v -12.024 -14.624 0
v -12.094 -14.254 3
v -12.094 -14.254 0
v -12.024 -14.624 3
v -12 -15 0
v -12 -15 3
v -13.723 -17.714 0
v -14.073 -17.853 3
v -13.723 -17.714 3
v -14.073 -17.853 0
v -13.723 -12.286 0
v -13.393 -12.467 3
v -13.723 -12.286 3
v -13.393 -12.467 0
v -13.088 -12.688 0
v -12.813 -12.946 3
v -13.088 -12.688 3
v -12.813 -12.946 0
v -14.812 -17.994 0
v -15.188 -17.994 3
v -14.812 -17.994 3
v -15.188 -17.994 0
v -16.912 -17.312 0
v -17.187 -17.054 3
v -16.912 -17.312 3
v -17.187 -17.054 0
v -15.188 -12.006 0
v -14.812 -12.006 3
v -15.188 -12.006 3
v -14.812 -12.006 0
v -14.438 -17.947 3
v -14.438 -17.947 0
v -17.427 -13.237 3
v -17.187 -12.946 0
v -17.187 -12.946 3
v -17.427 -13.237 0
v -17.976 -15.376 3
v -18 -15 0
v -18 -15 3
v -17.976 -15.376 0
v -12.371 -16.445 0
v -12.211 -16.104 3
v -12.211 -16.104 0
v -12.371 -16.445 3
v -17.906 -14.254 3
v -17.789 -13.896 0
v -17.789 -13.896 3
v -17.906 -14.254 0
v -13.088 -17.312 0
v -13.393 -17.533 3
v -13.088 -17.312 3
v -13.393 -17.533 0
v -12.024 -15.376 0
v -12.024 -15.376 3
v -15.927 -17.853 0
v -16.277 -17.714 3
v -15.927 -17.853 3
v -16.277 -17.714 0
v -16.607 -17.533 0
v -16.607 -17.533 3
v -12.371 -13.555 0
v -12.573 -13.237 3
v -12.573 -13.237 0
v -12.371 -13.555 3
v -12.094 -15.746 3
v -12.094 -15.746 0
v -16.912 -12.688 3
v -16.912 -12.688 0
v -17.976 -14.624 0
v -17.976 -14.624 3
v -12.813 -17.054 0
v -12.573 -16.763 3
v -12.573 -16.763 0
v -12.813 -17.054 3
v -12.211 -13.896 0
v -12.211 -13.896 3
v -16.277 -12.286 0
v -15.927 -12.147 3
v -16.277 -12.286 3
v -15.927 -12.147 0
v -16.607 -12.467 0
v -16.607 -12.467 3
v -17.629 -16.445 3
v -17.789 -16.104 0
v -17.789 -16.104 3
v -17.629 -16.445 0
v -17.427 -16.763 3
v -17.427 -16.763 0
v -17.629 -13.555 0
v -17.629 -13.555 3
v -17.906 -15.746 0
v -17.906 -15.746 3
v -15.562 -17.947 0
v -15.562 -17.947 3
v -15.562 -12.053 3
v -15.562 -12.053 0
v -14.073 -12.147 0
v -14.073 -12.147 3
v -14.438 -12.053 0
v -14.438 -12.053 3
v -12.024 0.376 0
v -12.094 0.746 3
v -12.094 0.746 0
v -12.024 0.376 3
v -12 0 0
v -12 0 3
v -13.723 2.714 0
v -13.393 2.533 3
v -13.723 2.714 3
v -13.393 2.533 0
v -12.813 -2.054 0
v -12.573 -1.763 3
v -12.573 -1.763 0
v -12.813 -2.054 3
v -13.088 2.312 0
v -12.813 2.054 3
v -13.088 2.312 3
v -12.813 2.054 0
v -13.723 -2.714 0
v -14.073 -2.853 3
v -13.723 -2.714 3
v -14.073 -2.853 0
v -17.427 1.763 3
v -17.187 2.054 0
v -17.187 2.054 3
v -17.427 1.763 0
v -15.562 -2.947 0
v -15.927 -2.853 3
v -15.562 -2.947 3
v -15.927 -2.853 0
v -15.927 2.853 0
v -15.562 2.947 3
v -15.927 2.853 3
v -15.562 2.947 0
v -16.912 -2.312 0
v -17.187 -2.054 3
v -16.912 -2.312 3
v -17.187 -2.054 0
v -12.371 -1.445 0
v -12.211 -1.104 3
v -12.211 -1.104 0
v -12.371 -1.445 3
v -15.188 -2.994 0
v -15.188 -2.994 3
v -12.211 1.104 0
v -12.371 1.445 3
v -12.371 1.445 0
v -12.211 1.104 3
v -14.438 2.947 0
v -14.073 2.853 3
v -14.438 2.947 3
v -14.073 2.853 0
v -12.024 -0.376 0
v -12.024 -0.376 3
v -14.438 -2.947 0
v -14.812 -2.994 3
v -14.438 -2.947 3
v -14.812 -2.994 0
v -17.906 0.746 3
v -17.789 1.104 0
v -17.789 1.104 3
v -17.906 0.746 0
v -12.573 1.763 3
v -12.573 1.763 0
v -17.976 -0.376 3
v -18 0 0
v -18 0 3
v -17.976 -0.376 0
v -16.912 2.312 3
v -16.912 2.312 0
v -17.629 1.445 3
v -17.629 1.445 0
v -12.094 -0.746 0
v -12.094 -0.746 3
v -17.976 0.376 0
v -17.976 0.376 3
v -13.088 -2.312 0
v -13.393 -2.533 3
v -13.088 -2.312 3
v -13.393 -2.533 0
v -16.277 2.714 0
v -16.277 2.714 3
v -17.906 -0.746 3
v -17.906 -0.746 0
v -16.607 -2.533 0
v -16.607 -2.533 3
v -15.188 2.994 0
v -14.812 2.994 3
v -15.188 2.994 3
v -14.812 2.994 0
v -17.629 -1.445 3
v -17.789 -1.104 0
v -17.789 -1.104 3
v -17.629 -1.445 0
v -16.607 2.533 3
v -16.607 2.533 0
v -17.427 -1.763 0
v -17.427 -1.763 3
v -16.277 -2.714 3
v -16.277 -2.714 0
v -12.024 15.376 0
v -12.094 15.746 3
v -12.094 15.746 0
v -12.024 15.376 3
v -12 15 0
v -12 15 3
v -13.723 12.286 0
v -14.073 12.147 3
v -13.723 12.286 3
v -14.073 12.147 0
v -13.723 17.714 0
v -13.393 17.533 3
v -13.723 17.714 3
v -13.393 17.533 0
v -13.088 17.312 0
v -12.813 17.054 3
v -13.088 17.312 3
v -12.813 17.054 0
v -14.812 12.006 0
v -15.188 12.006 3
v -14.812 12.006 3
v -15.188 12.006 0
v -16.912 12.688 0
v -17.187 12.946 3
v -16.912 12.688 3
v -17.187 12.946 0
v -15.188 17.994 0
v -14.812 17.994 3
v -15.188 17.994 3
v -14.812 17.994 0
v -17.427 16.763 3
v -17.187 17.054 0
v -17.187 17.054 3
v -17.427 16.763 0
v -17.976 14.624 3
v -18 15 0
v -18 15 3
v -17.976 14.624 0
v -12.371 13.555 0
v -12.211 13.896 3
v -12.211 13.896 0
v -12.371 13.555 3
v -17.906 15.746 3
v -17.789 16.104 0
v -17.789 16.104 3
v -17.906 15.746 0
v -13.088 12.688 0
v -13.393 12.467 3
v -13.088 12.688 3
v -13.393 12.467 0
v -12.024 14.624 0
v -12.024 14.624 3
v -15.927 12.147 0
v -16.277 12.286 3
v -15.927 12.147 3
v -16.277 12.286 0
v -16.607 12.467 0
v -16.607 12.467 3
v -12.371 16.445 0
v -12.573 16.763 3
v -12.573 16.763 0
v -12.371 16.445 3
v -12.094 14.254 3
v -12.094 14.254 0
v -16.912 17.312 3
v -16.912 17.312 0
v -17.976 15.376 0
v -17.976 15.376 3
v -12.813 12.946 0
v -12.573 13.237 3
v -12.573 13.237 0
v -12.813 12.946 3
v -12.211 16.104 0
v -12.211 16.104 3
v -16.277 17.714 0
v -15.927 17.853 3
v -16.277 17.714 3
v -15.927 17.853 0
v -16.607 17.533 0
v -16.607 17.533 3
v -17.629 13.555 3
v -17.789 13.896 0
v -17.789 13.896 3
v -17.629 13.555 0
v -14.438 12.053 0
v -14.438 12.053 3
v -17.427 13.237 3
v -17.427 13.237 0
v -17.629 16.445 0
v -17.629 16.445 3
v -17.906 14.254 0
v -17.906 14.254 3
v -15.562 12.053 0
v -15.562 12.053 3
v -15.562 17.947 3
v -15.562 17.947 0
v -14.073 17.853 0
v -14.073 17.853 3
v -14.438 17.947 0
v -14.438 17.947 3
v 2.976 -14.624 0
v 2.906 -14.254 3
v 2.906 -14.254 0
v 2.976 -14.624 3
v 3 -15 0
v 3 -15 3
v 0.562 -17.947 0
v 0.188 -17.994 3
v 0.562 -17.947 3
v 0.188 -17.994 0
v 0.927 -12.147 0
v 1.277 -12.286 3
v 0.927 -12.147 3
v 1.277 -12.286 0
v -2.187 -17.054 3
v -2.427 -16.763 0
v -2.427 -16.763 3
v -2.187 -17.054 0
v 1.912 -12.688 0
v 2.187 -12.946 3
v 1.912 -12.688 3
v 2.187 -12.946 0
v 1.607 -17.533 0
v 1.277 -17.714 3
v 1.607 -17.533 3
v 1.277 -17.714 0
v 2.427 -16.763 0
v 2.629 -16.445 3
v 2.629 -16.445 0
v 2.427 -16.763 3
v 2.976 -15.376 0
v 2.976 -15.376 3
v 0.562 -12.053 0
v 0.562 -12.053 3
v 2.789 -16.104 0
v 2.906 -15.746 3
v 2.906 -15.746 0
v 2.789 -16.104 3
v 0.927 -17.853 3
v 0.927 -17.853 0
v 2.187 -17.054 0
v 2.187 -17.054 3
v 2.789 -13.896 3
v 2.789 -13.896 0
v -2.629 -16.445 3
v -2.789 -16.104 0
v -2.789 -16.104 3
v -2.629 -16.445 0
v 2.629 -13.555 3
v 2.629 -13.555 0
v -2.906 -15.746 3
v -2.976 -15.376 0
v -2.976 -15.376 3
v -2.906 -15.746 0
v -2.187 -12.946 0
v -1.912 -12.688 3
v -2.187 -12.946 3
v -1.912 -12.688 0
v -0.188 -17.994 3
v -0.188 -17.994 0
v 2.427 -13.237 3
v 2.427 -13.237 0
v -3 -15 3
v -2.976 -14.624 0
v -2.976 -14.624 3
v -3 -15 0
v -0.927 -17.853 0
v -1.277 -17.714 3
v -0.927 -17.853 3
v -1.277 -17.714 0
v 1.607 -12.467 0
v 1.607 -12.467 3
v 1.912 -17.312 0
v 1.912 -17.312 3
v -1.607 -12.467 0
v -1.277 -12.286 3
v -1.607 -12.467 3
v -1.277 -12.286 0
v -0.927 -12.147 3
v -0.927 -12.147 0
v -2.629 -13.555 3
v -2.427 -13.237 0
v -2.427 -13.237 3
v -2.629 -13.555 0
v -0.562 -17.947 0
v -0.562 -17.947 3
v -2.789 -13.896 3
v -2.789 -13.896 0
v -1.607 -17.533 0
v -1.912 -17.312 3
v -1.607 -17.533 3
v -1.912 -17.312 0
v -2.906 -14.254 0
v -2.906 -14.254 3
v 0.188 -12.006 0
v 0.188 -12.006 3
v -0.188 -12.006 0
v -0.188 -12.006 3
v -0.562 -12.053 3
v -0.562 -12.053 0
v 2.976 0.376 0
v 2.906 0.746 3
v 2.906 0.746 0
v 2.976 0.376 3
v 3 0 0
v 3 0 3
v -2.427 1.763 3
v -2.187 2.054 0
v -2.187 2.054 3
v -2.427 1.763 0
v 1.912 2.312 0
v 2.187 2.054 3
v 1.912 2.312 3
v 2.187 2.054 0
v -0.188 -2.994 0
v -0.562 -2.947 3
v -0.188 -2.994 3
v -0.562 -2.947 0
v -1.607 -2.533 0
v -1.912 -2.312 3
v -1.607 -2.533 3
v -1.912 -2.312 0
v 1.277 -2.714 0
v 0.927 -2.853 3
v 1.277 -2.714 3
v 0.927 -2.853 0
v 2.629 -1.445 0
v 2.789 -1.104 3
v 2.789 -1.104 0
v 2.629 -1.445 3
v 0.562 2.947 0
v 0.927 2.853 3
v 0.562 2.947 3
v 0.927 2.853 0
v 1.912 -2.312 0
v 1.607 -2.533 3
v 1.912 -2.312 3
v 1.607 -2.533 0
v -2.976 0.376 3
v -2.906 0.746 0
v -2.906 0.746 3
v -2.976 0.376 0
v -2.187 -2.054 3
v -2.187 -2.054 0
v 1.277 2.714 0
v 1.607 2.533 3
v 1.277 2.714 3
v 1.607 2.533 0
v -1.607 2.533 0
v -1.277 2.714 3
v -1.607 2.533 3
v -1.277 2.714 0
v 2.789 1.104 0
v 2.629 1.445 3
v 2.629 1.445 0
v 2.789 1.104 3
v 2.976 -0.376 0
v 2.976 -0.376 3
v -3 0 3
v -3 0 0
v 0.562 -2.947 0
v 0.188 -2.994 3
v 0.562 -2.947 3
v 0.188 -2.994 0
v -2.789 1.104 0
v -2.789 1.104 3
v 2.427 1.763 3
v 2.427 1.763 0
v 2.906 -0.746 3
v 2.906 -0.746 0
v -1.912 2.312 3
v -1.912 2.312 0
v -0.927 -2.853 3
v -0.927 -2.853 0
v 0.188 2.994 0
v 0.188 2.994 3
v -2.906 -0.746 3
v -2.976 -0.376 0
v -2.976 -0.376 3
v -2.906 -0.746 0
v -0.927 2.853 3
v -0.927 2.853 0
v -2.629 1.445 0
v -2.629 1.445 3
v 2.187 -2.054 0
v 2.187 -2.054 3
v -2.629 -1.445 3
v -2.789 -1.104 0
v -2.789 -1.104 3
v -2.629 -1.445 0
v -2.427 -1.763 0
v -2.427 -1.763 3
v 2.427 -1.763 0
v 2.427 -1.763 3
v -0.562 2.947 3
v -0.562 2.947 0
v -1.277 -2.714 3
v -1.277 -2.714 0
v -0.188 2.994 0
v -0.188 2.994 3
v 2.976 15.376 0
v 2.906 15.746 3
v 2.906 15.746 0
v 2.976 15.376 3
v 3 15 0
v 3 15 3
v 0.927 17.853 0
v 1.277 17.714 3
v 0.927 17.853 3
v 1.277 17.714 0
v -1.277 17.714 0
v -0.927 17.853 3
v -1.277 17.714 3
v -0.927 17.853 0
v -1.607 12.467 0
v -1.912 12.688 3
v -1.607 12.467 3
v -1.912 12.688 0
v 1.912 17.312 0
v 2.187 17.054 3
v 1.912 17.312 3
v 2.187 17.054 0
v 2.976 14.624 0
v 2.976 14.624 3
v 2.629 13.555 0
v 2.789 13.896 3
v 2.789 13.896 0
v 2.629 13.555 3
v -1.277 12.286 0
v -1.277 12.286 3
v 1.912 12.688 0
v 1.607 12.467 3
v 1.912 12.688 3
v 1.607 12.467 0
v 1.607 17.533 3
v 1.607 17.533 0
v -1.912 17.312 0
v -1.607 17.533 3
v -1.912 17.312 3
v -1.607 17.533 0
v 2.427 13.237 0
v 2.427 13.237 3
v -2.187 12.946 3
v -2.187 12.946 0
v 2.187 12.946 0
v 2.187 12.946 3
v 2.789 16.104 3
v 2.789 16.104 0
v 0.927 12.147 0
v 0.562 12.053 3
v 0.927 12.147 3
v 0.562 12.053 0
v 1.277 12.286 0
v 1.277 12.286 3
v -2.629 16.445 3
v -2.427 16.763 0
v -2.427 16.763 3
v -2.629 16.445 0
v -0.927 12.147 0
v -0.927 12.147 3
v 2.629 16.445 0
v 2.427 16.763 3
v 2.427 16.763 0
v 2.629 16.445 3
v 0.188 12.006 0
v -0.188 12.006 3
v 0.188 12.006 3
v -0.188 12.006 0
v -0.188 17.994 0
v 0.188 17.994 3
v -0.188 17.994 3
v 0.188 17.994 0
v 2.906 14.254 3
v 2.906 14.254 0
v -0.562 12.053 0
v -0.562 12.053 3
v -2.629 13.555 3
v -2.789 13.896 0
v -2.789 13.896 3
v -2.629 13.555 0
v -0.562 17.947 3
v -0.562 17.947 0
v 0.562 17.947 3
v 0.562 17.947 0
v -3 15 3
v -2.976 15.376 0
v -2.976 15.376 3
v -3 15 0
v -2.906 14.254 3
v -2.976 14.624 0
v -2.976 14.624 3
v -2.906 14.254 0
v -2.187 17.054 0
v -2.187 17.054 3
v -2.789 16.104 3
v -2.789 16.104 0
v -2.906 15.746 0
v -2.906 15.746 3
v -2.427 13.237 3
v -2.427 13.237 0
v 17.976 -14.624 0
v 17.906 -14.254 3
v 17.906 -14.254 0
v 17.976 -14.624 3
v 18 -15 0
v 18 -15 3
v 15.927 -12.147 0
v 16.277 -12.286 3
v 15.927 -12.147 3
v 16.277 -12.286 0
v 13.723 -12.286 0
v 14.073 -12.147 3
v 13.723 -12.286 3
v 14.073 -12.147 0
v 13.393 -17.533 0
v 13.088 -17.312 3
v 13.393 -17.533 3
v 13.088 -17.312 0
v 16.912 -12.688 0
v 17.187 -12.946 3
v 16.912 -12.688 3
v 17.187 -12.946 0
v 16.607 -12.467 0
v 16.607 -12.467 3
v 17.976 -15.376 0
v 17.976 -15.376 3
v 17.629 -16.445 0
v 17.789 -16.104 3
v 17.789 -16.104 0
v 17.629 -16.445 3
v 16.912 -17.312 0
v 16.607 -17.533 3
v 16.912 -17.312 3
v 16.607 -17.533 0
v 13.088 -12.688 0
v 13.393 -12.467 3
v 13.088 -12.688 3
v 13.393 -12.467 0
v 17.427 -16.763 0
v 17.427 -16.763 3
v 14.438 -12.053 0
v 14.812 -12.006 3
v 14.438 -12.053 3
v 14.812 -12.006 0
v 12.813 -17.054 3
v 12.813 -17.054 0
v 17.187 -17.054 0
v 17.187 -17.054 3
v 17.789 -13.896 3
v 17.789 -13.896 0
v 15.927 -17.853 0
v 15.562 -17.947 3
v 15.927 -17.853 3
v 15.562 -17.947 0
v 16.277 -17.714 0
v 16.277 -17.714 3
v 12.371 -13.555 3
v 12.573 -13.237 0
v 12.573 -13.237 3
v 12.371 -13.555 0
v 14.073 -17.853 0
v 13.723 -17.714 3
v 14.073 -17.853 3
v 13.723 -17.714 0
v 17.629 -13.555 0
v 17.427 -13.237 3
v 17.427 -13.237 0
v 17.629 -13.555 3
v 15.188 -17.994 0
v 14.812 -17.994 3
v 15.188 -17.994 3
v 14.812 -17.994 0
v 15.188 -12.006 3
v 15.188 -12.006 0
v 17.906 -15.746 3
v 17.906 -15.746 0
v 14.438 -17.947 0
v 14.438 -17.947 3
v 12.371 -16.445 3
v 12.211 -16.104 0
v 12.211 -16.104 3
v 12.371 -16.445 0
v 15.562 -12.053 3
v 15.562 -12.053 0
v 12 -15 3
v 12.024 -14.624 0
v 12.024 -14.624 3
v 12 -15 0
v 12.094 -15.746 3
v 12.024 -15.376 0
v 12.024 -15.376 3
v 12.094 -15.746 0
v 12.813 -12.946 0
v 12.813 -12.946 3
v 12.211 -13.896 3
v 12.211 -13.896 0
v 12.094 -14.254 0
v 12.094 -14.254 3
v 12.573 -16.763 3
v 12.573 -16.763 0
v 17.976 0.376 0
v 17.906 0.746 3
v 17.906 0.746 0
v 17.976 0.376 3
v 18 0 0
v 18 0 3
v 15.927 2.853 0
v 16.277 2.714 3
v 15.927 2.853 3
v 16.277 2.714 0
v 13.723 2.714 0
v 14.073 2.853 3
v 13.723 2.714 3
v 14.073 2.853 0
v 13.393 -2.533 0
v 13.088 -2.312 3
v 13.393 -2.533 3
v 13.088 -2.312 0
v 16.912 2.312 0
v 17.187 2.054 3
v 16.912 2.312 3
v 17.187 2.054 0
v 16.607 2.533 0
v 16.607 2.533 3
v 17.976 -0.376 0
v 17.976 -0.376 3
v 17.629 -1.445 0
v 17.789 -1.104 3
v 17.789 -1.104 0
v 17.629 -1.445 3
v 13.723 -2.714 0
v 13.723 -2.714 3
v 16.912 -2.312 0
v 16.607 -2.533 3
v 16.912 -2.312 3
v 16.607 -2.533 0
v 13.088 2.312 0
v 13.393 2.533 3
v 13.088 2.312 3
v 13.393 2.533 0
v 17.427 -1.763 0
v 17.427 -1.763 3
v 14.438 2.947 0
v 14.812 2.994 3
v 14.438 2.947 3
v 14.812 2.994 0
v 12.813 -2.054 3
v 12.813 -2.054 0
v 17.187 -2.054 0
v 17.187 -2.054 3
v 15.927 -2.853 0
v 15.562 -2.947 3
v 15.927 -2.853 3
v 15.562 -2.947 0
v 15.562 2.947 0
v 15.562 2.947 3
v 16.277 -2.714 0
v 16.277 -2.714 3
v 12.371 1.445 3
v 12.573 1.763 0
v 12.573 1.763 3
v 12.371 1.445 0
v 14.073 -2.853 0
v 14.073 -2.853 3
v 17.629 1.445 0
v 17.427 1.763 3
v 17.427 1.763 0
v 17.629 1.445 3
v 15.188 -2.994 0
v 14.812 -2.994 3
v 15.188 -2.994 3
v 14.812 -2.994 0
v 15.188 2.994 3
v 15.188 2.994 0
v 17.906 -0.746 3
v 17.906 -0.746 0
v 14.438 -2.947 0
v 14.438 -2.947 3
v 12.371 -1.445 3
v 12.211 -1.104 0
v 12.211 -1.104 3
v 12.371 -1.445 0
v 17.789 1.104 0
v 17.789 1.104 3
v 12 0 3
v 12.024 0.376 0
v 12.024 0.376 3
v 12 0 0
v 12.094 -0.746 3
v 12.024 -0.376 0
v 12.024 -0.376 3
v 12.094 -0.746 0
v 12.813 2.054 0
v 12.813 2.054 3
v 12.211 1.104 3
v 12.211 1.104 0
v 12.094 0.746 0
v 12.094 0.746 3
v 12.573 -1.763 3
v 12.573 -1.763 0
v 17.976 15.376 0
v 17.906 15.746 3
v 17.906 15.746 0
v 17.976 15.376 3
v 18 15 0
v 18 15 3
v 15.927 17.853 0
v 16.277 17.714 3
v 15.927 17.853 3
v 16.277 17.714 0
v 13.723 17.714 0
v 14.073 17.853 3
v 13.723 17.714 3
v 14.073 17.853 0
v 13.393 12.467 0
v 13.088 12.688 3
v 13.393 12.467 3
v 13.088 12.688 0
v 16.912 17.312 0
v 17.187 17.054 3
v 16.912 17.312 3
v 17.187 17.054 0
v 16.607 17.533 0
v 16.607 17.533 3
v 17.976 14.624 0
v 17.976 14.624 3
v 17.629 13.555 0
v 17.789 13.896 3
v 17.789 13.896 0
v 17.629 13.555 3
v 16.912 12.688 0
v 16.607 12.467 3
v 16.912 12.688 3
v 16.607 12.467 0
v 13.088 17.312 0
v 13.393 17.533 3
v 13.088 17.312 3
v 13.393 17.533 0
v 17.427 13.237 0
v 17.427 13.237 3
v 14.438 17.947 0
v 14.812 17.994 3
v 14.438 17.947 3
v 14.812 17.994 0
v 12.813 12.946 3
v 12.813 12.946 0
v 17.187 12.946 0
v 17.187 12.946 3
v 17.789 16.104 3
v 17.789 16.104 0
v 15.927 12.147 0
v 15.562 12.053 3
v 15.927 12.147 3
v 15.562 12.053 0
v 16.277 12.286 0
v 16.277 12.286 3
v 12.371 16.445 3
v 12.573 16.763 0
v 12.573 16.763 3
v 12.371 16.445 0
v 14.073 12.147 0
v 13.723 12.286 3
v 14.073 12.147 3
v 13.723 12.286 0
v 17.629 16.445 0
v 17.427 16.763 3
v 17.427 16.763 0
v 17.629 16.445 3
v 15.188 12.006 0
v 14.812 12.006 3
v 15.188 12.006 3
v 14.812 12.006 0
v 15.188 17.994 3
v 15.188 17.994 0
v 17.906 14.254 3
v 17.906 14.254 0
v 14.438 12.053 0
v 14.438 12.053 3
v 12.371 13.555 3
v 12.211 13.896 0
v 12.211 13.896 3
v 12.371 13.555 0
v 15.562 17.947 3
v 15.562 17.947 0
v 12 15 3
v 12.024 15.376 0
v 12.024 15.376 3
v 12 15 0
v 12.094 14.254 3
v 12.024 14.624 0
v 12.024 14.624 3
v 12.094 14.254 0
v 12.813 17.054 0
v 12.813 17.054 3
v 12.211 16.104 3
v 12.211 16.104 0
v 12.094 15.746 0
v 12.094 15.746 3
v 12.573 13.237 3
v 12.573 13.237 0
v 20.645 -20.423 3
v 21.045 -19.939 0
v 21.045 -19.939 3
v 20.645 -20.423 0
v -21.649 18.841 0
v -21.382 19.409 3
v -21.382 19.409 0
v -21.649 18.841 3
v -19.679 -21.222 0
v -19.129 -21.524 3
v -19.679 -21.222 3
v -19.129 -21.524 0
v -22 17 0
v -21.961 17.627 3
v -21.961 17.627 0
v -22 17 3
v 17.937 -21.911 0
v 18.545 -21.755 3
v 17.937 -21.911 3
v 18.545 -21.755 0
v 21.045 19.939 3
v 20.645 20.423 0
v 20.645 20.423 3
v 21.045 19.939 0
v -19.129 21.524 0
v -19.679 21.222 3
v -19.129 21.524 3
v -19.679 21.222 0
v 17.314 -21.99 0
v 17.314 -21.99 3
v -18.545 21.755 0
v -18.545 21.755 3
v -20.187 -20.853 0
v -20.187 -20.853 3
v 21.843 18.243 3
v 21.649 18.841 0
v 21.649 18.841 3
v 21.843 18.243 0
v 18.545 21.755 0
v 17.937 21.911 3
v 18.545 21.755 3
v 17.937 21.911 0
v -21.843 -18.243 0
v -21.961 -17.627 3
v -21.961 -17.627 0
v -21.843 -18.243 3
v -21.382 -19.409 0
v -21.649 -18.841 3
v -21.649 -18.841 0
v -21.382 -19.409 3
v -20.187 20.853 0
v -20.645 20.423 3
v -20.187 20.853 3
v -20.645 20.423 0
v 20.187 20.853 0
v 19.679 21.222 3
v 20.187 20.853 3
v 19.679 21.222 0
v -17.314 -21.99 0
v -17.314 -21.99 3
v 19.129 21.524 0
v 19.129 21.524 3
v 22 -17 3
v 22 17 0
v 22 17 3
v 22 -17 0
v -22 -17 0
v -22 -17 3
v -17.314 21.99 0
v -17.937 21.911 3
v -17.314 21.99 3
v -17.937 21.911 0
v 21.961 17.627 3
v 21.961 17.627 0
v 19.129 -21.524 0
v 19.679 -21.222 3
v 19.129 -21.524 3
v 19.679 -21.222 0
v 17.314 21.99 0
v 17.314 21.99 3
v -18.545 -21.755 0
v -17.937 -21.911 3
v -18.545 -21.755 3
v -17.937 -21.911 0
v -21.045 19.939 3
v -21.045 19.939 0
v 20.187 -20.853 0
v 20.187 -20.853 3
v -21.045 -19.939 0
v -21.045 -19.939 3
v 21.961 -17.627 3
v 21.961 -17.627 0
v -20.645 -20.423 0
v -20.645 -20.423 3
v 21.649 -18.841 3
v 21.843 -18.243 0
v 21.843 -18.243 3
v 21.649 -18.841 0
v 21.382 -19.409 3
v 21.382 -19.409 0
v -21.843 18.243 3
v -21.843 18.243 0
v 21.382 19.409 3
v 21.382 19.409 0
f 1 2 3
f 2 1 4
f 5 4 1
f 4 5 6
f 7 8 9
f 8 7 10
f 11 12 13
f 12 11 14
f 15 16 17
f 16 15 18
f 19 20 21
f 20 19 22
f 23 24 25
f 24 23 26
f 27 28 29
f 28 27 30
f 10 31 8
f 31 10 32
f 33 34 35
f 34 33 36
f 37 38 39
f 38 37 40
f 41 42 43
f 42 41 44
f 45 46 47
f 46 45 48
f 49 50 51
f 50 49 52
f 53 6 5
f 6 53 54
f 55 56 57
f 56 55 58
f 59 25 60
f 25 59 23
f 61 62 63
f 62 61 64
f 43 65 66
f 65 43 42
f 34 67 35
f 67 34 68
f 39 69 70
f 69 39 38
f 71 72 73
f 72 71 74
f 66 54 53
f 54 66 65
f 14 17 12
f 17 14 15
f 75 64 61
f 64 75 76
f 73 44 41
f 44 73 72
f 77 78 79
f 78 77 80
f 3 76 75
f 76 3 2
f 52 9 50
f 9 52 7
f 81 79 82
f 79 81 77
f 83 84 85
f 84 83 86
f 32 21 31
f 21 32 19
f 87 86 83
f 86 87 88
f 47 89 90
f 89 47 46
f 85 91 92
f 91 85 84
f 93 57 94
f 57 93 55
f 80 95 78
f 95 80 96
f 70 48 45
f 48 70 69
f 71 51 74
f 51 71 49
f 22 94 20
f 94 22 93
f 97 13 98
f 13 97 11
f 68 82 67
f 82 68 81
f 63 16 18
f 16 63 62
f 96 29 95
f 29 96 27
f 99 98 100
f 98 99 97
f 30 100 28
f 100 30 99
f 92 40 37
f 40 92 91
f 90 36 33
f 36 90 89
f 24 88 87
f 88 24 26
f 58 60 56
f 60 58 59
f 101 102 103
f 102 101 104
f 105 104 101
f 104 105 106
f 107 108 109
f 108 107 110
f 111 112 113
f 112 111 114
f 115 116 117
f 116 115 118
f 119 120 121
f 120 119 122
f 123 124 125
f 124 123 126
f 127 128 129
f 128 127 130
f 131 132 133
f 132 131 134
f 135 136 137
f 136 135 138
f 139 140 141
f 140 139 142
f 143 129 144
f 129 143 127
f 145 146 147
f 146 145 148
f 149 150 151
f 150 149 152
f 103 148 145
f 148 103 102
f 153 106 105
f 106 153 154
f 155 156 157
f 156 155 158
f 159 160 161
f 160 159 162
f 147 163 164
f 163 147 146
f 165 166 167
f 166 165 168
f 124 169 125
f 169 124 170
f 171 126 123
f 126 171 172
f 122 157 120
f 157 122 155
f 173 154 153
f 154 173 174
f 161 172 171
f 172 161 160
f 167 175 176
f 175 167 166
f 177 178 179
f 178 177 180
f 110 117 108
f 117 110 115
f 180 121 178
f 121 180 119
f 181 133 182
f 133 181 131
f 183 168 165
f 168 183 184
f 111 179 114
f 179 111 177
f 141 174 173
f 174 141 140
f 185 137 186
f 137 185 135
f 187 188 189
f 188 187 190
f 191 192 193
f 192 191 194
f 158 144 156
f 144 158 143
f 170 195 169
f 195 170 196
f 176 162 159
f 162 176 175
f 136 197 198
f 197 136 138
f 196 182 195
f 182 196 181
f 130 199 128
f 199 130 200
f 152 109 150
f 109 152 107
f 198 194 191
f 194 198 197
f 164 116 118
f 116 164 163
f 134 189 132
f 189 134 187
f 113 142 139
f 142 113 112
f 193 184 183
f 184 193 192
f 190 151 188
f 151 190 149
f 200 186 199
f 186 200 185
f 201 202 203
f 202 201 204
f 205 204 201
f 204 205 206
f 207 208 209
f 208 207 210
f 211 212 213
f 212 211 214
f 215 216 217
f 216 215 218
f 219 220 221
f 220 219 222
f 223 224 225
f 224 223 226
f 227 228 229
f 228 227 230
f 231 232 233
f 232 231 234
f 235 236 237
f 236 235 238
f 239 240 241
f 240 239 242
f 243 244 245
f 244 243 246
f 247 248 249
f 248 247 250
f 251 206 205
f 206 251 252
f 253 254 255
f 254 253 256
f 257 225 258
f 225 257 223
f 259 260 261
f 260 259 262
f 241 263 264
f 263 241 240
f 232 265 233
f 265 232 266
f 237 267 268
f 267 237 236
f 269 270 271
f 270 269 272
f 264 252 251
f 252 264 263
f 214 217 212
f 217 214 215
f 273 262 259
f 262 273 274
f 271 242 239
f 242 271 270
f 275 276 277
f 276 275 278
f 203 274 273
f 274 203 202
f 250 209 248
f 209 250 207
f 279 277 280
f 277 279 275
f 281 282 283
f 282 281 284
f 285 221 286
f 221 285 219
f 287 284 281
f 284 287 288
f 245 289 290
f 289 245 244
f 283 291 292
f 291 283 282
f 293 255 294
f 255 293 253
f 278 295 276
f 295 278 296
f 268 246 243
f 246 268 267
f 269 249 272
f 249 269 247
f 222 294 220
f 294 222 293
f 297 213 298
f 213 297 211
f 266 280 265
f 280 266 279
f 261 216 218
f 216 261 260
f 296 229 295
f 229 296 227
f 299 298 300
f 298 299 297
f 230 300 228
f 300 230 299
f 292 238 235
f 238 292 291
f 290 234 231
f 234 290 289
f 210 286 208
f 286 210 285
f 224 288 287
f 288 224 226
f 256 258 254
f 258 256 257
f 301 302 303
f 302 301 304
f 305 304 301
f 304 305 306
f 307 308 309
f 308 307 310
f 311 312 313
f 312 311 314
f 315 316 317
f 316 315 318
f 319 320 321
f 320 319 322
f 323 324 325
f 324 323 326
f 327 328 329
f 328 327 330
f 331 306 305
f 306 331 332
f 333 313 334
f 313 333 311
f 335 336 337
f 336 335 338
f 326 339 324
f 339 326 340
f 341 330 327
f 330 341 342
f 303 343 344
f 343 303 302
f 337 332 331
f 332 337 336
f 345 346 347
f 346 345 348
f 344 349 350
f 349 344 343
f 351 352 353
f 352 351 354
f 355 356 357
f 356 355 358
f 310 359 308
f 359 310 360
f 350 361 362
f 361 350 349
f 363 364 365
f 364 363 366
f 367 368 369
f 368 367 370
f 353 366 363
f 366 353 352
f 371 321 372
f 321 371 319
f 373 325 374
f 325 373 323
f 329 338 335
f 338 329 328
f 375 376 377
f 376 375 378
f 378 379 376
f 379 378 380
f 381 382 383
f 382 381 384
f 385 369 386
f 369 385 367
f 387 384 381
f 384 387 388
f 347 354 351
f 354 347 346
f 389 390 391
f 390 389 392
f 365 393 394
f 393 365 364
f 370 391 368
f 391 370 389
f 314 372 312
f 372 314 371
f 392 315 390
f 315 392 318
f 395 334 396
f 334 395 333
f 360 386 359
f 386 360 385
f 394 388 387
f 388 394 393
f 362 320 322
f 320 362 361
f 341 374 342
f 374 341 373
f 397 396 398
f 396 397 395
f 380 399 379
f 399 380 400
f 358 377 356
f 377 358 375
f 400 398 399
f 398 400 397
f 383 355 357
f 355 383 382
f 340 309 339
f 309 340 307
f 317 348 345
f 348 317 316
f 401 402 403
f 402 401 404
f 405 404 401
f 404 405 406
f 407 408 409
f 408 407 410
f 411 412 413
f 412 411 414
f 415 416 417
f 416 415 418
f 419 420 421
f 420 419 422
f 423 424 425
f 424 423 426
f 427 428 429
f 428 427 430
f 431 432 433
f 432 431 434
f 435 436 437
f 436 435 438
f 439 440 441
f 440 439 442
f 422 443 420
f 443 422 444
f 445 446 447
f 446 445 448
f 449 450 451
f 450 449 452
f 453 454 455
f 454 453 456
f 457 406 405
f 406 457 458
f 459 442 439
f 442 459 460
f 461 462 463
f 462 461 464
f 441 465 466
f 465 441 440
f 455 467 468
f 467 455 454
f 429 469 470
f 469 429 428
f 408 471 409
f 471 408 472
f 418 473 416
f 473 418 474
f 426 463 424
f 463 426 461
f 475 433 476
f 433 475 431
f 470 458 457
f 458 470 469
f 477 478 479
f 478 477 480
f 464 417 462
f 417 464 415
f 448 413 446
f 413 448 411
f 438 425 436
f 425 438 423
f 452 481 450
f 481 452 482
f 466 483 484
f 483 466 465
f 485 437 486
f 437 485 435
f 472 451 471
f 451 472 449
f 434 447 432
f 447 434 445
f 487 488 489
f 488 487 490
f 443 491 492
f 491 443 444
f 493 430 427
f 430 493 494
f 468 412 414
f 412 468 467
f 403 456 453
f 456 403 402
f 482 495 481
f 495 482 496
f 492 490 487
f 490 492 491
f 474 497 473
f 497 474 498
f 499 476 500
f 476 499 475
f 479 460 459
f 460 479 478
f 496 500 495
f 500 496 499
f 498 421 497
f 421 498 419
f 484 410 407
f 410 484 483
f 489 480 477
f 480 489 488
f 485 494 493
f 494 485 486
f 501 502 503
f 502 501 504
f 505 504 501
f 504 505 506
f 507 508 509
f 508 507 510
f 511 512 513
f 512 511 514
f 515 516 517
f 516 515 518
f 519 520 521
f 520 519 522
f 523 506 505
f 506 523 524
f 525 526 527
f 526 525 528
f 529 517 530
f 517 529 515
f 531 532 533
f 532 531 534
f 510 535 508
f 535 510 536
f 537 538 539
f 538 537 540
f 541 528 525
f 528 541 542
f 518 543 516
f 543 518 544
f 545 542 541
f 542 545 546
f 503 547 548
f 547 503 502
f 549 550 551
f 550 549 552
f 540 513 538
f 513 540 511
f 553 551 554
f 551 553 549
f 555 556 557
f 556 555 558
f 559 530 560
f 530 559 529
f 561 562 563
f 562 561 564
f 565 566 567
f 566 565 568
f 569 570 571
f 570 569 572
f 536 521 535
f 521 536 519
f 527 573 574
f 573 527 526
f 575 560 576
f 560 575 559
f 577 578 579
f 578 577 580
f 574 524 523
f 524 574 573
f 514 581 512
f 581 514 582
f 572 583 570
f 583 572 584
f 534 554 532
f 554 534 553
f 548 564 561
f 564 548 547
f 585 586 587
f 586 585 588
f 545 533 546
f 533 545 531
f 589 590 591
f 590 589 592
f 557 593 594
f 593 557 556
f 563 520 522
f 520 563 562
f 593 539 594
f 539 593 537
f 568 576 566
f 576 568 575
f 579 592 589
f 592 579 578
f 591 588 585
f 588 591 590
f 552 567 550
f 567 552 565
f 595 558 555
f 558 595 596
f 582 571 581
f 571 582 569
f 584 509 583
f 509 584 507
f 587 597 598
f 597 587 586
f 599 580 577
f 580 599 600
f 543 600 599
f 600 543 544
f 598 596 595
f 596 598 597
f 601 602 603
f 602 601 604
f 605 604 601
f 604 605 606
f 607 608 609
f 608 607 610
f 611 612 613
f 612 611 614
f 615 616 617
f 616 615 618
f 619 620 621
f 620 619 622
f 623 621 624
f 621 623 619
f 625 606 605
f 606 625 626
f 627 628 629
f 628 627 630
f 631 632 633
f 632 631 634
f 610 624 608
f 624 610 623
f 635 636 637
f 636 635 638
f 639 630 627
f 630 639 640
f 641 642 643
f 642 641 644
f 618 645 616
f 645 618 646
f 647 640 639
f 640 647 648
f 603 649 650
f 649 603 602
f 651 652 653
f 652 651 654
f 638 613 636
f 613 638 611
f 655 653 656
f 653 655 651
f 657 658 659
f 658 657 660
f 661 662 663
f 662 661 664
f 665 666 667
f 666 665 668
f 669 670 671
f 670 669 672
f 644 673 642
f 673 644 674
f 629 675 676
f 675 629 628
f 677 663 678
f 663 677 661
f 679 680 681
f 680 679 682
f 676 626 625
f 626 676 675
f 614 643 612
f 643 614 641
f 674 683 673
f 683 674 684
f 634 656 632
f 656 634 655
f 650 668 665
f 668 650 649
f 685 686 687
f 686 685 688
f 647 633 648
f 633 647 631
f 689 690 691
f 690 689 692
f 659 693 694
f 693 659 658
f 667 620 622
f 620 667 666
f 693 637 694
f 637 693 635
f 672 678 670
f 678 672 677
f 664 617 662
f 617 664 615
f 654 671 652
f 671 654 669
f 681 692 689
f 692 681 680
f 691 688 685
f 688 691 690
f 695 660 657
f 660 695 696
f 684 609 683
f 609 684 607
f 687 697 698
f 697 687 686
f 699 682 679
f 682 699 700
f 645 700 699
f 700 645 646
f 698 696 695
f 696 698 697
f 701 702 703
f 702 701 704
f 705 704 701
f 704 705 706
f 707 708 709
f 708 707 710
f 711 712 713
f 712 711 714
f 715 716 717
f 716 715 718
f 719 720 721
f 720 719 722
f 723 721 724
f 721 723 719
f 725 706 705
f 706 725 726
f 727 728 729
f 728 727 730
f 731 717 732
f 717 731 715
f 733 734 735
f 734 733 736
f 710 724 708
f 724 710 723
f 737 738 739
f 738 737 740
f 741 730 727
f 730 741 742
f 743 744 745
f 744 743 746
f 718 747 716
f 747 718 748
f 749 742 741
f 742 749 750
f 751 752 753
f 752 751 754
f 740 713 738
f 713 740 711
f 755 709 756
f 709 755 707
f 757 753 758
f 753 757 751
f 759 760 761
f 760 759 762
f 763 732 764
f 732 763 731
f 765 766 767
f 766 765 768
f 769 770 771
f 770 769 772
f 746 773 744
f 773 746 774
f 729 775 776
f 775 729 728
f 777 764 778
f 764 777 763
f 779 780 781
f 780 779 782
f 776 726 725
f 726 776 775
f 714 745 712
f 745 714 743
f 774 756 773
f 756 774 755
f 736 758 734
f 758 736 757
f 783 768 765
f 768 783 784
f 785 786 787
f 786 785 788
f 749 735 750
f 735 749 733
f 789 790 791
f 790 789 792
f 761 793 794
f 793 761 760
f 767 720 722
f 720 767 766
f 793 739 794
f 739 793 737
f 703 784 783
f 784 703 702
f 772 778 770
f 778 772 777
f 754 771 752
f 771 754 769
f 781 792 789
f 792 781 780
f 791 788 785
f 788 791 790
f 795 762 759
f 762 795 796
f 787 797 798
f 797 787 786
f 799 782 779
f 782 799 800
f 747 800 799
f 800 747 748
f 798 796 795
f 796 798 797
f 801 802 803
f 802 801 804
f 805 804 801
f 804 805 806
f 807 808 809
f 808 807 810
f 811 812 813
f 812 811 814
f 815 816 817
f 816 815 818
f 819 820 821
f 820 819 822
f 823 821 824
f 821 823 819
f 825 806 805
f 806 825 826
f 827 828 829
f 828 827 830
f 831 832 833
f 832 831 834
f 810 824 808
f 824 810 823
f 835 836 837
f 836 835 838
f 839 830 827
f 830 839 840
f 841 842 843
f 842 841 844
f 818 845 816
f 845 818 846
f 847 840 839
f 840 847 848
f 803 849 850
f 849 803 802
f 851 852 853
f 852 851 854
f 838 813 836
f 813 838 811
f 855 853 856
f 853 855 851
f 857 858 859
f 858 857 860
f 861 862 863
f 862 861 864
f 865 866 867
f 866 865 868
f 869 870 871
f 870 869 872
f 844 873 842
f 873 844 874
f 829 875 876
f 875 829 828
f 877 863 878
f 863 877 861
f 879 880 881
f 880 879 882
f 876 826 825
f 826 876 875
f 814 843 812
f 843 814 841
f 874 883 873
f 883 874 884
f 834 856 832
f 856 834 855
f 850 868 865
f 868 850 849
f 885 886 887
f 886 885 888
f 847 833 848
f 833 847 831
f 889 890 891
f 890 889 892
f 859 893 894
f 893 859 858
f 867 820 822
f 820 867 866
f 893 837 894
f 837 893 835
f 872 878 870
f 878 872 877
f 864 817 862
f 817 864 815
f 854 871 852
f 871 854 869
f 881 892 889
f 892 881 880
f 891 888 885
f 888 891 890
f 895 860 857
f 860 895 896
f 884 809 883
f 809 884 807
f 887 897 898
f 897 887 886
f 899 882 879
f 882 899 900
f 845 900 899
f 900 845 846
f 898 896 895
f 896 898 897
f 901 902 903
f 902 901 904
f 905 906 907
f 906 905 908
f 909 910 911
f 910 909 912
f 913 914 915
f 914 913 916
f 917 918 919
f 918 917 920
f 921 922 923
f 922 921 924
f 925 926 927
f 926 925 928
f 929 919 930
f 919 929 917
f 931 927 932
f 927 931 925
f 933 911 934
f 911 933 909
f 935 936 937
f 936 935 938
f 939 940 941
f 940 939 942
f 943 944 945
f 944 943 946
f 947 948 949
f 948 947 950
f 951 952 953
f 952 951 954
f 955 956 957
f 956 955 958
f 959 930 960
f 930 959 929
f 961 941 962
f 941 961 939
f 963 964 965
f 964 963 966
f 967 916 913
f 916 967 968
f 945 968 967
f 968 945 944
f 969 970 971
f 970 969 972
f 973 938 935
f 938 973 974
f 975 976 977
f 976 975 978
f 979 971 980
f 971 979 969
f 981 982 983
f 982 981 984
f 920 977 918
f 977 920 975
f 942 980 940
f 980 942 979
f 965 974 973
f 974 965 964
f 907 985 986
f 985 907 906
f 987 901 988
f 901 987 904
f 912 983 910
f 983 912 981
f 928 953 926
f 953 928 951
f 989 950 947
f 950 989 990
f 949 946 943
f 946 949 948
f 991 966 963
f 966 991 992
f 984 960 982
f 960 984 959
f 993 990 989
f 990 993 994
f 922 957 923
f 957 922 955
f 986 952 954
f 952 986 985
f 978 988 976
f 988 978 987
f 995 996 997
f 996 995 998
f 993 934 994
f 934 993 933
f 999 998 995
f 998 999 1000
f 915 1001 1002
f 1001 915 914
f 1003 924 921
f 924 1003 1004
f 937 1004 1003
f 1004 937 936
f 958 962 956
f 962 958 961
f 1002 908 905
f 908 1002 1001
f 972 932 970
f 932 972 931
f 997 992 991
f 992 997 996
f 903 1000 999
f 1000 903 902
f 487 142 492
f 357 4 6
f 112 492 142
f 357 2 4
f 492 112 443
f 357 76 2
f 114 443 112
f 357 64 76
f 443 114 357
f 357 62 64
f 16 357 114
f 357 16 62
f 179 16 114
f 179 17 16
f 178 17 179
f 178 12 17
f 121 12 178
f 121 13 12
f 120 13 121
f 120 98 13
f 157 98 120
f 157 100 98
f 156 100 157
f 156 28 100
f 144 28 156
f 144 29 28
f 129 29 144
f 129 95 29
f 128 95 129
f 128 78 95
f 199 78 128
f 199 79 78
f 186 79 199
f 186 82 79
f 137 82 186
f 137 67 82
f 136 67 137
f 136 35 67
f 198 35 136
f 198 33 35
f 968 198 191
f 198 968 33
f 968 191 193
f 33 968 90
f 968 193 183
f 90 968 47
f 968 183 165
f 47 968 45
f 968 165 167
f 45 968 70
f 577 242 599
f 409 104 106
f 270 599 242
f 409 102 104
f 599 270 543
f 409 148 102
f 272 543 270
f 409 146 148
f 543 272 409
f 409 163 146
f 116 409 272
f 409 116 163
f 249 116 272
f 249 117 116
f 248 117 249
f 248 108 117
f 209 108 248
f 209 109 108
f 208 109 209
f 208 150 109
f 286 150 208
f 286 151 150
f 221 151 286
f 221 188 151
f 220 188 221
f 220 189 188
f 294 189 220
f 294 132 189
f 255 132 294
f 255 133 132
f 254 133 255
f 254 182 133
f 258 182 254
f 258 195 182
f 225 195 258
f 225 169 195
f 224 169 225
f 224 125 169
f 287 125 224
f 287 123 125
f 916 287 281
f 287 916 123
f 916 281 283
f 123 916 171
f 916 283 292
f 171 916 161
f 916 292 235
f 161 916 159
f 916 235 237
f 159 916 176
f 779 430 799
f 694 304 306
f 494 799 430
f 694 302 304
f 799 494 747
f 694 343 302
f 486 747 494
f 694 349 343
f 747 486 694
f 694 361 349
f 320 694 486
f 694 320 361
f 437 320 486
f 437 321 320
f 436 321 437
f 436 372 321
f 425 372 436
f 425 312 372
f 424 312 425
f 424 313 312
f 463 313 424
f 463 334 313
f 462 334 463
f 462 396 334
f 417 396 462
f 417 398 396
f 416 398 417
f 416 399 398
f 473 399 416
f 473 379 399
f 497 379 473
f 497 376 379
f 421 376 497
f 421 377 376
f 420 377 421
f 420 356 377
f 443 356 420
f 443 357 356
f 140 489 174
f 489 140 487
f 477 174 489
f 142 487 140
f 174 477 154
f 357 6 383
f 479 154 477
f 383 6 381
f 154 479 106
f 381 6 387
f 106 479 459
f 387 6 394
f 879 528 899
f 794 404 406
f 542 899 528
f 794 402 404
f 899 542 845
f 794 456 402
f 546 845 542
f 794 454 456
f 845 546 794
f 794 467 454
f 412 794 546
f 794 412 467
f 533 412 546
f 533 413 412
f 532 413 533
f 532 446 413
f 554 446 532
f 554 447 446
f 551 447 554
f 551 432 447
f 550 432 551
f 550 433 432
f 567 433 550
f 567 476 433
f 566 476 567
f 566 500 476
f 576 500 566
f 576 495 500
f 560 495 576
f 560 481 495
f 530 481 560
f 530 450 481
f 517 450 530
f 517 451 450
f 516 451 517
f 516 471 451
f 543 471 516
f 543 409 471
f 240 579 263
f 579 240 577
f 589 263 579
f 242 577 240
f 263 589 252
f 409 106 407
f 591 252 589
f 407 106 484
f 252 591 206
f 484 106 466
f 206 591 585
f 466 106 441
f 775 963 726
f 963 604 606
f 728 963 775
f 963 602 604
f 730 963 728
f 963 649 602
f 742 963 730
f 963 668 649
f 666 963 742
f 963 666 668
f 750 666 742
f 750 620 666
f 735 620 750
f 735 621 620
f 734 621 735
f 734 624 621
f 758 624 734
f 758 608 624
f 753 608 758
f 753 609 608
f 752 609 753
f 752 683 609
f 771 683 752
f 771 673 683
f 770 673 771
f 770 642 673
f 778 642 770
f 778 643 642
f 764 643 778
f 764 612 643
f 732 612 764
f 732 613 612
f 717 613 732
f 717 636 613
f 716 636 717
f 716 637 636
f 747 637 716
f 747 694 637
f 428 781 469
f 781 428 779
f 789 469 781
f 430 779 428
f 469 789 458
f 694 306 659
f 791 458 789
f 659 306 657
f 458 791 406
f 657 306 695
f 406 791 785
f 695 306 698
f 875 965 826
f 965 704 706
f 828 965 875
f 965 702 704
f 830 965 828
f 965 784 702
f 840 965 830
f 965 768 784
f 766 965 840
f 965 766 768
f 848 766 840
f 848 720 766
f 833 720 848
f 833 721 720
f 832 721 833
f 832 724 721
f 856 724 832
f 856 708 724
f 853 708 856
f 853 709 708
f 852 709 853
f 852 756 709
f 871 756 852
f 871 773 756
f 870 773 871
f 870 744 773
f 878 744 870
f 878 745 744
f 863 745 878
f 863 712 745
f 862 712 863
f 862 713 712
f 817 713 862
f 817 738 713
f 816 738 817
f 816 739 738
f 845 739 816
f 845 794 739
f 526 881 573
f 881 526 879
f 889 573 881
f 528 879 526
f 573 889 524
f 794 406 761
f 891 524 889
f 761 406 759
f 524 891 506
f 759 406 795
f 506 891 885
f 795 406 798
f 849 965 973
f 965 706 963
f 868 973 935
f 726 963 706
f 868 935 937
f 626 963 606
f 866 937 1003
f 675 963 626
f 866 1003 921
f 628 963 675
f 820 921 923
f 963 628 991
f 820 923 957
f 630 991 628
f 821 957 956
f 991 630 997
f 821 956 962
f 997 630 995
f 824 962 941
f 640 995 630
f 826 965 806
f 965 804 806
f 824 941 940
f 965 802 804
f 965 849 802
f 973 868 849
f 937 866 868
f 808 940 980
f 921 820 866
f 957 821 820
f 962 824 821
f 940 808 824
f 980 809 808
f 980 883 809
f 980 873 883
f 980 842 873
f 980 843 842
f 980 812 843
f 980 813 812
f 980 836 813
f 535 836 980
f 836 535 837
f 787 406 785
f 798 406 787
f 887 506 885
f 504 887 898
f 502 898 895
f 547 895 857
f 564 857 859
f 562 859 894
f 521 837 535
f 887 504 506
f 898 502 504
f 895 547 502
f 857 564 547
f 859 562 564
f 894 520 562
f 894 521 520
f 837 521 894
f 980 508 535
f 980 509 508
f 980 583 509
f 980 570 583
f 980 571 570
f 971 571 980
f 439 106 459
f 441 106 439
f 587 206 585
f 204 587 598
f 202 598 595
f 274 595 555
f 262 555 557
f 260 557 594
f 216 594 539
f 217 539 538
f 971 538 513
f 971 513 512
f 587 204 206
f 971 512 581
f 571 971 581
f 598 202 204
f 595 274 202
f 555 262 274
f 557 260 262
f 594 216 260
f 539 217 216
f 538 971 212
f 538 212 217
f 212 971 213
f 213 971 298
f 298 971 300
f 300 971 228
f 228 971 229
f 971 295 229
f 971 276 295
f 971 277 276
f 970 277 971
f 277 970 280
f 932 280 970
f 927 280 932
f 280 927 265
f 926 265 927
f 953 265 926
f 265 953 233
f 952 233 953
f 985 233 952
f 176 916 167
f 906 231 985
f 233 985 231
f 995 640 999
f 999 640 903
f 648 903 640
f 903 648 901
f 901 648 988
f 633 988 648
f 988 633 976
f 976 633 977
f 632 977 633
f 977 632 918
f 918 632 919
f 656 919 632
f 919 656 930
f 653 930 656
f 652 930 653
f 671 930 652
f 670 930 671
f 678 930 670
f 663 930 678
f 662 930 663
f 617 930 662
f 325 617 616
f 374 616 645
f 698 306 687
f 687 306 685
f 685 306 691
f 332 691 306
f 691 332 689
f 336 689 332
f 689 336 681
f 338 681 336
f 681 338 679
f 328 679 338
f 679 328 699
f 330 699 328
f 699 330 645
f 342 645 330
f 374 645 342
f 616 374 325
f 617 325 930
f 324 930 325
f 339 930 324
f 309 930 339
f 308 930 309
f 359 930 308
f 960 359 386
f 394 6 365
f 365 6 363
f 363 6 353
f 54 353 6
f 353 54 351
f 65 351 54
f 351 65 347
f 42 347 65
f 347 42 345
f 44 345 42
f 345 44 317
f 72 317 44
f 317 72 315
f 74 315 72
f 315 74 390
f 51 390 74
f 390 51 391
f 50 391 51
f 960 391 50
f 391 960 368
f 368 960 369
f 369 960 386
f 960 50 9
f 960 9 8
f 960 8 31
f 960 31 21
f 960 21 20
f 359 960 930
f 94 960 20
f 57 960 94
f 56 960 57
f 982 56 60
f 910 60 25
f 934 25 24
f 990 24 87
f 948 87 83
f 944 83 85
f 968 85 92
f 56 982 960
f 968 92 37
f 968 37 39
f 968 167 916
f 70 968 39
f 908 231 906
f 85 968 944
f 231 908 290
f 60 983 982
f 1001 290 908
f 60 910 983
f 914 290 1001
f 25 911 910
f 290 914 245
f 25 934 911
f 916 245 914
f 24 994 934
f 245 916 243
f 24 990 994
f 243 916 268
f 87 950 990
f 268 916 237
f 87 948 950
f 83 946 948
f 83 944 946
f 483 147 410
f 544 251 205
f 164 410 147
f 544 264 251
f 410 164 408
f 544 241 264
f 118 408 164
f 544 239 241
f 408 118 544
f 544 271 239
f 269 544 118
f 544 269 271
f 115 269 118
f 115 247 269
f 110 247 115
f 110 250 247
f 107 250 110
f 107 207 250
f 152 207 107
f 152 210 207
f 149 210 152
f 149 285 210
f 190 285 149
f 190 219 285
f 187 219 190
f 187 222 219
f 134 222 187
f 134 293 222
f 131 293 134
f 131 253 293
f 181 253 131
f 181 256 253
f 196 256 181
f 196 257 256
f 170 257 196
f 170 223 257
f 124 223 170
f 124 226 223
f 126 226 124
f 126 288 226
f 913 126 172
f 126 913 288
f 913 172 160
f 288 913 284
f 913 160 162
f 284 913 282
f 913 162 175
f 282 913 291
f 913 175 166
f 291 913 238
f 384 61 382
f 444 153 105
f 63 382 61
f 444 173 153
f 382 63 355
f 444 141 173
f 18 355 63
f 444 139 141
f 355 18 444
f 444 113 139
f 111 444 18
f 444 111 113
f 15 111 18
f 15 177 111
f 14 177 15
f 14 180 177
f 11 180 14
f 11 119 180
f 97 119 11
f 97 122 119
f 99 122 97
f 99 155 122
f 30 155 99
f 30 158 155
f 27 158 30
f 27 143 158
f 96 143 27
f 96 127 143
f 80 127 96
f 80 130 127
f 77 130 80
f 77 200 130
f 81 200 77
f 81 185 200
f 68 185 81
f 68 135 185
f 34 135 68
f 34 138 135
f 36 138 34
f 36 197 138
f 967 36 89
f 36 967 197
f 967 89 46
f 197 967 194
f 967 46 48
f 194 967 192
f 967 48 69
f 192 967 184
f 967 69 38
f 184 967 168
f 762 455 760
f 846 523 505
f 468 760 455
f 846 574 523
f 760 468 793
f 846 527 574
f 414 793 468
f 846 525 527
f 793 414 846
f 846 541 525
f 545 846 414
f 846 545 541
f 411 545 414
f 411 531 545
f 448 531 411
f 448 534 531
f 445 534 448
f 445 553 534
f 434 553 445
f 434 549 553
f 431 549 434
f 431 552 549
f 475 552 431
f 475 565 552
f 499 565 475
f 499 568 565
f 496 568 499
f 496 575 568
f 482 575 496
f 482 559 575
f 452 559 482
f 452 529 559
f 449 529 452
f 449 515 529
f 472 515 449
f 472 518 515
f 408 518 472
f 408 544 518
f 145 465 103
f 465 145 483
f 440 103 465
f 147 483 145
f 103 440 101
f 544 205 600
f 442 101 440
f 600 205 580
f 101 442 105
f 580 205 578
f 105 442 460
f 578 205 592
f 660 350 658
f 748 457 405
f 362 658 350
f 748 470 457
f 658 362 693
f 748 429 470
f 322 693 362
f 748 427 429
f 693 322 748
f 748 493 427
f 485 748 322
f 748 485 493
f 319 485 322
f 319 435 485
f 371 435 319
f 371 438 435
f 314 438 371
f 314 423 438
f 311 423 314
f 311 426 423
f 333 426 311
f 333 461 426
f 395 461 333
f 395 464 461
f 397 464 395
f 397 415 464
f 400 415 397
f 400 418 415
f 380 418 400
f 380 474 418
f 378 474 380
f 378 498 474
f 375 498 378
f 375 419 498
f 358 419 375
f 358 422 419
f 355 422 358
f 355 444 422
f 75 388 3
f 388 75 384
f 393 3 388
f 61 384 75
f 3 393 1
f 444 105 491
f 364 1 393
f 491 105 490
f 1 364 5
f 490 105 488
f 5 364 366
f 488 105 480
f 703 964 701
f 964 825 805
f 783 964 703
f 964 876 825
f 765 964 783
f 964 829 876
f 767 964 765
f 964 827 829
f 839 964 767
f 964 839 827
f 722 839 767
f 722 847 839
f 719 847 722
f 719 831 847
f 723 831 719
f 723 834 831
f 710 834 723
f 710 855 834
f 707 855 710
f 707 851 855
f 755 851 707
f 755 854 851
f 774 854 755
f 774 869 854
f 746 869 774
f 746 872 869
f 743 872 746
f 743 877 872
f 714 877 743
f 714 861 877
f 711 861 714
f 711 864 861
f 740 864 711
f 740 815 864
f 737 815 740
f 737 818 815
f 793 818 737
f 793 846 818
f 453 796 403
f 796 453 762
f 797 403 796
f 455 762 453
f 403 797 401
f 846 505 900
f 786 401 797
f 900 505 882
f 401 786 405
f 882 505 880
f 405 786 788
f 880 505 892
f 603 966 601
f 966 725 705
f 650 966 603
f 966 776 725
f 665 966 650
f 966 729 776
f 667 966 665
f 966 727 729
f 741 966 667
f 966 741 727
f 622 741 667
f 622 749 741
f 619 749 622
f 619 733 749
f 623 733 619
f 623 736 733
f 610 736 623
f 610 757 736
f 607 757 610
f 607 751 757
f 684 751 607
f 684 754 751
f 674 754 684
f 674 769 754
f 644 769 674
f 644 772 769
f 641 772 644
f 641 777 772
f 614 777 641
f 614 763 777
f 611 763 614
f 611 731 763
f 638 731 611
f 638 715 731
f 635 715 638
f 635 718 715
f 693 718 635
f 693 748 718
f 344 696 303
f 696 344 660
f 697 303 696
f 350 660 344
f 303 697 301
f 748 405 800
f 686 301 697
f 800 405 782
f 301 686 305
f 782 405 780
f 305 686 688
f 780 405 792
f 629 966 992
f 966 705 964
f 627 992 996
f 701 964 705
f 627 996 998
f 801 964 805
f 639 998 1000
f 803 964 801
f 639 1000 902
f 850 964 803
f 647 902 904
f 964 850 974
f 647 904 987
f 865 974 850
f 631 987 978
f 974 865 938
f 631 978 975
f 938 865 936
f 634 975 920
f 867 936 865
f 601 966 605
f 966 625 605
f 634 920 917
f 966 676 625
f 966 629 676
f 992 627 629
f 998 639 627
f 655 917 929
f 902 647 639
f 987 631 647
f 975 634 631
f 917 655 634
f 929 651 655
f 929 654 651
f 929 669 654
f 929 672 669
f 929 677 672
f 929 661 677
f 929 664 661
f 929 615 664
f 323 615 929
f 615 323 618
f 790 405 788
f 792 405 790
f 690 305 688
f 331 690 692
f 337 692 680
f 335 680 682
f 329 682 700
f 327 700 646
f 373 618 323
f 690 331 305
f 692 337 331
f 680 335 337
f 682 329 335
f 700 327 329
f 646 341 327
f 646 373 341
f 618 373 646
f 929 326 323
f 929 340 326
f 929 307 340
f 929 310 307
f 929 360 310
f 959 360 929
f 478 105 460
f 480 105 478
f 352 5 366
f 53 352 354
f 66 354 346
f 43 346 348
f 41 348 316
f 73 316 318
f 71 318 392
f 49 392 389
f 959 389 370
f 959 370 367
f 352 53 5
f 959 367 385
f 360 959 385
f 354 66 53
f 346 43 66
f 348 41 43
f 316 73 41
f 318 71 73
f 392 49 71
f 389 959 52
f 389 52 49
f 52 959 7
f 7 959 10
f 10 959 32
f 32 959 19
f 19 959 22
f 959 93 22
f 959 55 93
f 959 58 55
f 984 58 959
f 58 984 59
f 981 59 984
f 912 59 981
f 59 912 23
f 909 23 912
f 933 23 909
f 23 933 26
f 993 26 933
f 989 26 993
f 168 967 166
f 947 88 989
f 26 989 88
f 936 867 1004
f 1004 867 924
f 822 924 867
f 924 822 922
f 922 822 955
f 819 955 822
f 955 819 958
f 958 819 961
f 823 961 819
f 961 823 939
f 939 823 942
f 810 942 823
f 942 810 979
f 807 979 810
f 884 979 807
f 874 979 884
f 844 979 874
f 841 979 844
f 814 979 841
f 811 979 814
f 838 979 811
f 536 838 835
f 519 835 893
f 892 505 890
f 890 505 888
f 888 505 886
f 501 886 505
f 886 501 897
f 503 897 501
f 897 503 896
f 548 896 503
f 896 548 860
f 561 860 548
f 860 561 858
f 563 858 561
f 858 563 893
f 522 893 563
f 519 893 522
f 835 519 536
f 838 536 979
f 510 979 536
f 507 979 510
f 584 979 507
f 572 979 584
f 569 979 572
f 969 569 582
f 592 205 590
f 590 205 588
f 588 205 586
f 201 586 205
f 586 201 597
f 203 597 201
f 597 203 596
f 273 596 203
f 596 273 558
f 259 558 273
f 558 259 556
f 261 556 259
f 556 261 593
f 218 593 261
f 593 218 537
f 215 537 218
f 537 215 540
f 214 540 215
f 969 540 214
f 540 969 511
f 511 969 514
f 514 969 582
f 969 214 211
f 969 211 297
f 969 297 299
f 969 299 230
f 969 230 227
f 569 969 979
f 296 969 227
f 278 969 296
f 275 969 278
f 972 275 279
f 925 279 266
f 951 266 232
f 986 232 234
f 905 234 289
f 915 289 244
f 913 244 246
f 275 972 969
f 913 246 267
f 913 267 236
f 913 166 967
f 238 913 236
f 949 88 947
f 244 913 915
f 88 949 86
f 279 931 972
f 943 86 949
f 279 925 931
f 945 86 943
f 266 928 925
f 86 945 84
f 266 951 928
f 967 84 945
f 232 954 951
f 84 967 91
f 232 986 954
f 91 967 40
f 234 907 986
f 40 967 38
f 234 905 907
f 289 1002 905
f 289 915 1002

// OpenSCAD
$fn = 50;


difference() {
	union() {
		hull() {
			translate(v = [-17.0000000000, 17.0000000000, 0]) {
				cylinder(h = 3, r = 5);
			}
			translate(v = [17.0000000000, 17.0000000000, 0]) {
				cylinder(h = 3, r = 5);
			}
			translate(v = [-17.0000000000, -17.0000000000, 0]) {
				cylinder(h = 3, r = 5);
			}
			translate(v = [17.0000000000, -17.0000000000, 0]) {
				cylinder(h = 3, r = 5);
			}
		}
	}
	union() {
		translate(v = [-15.0000000000, -15.0000000000, 0]) {
			translate(v = [0, 0, -100]) {
				cylinder(h = 200, r = 3.0000000000);
			}
		}
		translate(v = [-15.0000000000, 0.0000000000, 0]) {
			translate(v = [0, 0, -100]) {
				cylinder(h = 200, r = 3.0000000000);
			}
		}
		translate(v = [-15.0000000000, 15.0000000000, 0]) {
			translate(v = [0, 0, -100]) {
				cylinder(h = 200, r = 3.0000000000);
			}
		}
		translate(v = [0.0000000000, -15.0000000000, 0]) {
			translate(v = [0, 0, -100]) {
				cylinder(h = 200, r = 3.0000000000);
			}
		}
		translate(v = [0, 0, -100]) {
			cylinder(h = 200, r = 3.0000000000);
		}
		translate(v = [0.0000000000, 15.0000000000, 0]) {
			translate(v = [0, 0, -100]) {
				cylinder(h = 200, r = 3.0000000000);
			}
		}
		translate(v = [15.0000000000, -15.0000000000, 0]) {
			translate(v = [0, 0, -100]) {
				cylinder(h = 200, r = 3.0000000000);
			}
		}
		translate(v = [15.0000000000, 0.0000000000, 0]) {
			translate(v = [0, 0, -100]) {
				cylinder(h = 200, r = 3.0000000000);
			}
		}
		translate(v = [15.0000000000, 15.0000000000, 0]) {
			translate(v = [0, 0, -100]) {
				cylinder(h = 200, r = 3.0000000000);
			}
		}
	}
}
